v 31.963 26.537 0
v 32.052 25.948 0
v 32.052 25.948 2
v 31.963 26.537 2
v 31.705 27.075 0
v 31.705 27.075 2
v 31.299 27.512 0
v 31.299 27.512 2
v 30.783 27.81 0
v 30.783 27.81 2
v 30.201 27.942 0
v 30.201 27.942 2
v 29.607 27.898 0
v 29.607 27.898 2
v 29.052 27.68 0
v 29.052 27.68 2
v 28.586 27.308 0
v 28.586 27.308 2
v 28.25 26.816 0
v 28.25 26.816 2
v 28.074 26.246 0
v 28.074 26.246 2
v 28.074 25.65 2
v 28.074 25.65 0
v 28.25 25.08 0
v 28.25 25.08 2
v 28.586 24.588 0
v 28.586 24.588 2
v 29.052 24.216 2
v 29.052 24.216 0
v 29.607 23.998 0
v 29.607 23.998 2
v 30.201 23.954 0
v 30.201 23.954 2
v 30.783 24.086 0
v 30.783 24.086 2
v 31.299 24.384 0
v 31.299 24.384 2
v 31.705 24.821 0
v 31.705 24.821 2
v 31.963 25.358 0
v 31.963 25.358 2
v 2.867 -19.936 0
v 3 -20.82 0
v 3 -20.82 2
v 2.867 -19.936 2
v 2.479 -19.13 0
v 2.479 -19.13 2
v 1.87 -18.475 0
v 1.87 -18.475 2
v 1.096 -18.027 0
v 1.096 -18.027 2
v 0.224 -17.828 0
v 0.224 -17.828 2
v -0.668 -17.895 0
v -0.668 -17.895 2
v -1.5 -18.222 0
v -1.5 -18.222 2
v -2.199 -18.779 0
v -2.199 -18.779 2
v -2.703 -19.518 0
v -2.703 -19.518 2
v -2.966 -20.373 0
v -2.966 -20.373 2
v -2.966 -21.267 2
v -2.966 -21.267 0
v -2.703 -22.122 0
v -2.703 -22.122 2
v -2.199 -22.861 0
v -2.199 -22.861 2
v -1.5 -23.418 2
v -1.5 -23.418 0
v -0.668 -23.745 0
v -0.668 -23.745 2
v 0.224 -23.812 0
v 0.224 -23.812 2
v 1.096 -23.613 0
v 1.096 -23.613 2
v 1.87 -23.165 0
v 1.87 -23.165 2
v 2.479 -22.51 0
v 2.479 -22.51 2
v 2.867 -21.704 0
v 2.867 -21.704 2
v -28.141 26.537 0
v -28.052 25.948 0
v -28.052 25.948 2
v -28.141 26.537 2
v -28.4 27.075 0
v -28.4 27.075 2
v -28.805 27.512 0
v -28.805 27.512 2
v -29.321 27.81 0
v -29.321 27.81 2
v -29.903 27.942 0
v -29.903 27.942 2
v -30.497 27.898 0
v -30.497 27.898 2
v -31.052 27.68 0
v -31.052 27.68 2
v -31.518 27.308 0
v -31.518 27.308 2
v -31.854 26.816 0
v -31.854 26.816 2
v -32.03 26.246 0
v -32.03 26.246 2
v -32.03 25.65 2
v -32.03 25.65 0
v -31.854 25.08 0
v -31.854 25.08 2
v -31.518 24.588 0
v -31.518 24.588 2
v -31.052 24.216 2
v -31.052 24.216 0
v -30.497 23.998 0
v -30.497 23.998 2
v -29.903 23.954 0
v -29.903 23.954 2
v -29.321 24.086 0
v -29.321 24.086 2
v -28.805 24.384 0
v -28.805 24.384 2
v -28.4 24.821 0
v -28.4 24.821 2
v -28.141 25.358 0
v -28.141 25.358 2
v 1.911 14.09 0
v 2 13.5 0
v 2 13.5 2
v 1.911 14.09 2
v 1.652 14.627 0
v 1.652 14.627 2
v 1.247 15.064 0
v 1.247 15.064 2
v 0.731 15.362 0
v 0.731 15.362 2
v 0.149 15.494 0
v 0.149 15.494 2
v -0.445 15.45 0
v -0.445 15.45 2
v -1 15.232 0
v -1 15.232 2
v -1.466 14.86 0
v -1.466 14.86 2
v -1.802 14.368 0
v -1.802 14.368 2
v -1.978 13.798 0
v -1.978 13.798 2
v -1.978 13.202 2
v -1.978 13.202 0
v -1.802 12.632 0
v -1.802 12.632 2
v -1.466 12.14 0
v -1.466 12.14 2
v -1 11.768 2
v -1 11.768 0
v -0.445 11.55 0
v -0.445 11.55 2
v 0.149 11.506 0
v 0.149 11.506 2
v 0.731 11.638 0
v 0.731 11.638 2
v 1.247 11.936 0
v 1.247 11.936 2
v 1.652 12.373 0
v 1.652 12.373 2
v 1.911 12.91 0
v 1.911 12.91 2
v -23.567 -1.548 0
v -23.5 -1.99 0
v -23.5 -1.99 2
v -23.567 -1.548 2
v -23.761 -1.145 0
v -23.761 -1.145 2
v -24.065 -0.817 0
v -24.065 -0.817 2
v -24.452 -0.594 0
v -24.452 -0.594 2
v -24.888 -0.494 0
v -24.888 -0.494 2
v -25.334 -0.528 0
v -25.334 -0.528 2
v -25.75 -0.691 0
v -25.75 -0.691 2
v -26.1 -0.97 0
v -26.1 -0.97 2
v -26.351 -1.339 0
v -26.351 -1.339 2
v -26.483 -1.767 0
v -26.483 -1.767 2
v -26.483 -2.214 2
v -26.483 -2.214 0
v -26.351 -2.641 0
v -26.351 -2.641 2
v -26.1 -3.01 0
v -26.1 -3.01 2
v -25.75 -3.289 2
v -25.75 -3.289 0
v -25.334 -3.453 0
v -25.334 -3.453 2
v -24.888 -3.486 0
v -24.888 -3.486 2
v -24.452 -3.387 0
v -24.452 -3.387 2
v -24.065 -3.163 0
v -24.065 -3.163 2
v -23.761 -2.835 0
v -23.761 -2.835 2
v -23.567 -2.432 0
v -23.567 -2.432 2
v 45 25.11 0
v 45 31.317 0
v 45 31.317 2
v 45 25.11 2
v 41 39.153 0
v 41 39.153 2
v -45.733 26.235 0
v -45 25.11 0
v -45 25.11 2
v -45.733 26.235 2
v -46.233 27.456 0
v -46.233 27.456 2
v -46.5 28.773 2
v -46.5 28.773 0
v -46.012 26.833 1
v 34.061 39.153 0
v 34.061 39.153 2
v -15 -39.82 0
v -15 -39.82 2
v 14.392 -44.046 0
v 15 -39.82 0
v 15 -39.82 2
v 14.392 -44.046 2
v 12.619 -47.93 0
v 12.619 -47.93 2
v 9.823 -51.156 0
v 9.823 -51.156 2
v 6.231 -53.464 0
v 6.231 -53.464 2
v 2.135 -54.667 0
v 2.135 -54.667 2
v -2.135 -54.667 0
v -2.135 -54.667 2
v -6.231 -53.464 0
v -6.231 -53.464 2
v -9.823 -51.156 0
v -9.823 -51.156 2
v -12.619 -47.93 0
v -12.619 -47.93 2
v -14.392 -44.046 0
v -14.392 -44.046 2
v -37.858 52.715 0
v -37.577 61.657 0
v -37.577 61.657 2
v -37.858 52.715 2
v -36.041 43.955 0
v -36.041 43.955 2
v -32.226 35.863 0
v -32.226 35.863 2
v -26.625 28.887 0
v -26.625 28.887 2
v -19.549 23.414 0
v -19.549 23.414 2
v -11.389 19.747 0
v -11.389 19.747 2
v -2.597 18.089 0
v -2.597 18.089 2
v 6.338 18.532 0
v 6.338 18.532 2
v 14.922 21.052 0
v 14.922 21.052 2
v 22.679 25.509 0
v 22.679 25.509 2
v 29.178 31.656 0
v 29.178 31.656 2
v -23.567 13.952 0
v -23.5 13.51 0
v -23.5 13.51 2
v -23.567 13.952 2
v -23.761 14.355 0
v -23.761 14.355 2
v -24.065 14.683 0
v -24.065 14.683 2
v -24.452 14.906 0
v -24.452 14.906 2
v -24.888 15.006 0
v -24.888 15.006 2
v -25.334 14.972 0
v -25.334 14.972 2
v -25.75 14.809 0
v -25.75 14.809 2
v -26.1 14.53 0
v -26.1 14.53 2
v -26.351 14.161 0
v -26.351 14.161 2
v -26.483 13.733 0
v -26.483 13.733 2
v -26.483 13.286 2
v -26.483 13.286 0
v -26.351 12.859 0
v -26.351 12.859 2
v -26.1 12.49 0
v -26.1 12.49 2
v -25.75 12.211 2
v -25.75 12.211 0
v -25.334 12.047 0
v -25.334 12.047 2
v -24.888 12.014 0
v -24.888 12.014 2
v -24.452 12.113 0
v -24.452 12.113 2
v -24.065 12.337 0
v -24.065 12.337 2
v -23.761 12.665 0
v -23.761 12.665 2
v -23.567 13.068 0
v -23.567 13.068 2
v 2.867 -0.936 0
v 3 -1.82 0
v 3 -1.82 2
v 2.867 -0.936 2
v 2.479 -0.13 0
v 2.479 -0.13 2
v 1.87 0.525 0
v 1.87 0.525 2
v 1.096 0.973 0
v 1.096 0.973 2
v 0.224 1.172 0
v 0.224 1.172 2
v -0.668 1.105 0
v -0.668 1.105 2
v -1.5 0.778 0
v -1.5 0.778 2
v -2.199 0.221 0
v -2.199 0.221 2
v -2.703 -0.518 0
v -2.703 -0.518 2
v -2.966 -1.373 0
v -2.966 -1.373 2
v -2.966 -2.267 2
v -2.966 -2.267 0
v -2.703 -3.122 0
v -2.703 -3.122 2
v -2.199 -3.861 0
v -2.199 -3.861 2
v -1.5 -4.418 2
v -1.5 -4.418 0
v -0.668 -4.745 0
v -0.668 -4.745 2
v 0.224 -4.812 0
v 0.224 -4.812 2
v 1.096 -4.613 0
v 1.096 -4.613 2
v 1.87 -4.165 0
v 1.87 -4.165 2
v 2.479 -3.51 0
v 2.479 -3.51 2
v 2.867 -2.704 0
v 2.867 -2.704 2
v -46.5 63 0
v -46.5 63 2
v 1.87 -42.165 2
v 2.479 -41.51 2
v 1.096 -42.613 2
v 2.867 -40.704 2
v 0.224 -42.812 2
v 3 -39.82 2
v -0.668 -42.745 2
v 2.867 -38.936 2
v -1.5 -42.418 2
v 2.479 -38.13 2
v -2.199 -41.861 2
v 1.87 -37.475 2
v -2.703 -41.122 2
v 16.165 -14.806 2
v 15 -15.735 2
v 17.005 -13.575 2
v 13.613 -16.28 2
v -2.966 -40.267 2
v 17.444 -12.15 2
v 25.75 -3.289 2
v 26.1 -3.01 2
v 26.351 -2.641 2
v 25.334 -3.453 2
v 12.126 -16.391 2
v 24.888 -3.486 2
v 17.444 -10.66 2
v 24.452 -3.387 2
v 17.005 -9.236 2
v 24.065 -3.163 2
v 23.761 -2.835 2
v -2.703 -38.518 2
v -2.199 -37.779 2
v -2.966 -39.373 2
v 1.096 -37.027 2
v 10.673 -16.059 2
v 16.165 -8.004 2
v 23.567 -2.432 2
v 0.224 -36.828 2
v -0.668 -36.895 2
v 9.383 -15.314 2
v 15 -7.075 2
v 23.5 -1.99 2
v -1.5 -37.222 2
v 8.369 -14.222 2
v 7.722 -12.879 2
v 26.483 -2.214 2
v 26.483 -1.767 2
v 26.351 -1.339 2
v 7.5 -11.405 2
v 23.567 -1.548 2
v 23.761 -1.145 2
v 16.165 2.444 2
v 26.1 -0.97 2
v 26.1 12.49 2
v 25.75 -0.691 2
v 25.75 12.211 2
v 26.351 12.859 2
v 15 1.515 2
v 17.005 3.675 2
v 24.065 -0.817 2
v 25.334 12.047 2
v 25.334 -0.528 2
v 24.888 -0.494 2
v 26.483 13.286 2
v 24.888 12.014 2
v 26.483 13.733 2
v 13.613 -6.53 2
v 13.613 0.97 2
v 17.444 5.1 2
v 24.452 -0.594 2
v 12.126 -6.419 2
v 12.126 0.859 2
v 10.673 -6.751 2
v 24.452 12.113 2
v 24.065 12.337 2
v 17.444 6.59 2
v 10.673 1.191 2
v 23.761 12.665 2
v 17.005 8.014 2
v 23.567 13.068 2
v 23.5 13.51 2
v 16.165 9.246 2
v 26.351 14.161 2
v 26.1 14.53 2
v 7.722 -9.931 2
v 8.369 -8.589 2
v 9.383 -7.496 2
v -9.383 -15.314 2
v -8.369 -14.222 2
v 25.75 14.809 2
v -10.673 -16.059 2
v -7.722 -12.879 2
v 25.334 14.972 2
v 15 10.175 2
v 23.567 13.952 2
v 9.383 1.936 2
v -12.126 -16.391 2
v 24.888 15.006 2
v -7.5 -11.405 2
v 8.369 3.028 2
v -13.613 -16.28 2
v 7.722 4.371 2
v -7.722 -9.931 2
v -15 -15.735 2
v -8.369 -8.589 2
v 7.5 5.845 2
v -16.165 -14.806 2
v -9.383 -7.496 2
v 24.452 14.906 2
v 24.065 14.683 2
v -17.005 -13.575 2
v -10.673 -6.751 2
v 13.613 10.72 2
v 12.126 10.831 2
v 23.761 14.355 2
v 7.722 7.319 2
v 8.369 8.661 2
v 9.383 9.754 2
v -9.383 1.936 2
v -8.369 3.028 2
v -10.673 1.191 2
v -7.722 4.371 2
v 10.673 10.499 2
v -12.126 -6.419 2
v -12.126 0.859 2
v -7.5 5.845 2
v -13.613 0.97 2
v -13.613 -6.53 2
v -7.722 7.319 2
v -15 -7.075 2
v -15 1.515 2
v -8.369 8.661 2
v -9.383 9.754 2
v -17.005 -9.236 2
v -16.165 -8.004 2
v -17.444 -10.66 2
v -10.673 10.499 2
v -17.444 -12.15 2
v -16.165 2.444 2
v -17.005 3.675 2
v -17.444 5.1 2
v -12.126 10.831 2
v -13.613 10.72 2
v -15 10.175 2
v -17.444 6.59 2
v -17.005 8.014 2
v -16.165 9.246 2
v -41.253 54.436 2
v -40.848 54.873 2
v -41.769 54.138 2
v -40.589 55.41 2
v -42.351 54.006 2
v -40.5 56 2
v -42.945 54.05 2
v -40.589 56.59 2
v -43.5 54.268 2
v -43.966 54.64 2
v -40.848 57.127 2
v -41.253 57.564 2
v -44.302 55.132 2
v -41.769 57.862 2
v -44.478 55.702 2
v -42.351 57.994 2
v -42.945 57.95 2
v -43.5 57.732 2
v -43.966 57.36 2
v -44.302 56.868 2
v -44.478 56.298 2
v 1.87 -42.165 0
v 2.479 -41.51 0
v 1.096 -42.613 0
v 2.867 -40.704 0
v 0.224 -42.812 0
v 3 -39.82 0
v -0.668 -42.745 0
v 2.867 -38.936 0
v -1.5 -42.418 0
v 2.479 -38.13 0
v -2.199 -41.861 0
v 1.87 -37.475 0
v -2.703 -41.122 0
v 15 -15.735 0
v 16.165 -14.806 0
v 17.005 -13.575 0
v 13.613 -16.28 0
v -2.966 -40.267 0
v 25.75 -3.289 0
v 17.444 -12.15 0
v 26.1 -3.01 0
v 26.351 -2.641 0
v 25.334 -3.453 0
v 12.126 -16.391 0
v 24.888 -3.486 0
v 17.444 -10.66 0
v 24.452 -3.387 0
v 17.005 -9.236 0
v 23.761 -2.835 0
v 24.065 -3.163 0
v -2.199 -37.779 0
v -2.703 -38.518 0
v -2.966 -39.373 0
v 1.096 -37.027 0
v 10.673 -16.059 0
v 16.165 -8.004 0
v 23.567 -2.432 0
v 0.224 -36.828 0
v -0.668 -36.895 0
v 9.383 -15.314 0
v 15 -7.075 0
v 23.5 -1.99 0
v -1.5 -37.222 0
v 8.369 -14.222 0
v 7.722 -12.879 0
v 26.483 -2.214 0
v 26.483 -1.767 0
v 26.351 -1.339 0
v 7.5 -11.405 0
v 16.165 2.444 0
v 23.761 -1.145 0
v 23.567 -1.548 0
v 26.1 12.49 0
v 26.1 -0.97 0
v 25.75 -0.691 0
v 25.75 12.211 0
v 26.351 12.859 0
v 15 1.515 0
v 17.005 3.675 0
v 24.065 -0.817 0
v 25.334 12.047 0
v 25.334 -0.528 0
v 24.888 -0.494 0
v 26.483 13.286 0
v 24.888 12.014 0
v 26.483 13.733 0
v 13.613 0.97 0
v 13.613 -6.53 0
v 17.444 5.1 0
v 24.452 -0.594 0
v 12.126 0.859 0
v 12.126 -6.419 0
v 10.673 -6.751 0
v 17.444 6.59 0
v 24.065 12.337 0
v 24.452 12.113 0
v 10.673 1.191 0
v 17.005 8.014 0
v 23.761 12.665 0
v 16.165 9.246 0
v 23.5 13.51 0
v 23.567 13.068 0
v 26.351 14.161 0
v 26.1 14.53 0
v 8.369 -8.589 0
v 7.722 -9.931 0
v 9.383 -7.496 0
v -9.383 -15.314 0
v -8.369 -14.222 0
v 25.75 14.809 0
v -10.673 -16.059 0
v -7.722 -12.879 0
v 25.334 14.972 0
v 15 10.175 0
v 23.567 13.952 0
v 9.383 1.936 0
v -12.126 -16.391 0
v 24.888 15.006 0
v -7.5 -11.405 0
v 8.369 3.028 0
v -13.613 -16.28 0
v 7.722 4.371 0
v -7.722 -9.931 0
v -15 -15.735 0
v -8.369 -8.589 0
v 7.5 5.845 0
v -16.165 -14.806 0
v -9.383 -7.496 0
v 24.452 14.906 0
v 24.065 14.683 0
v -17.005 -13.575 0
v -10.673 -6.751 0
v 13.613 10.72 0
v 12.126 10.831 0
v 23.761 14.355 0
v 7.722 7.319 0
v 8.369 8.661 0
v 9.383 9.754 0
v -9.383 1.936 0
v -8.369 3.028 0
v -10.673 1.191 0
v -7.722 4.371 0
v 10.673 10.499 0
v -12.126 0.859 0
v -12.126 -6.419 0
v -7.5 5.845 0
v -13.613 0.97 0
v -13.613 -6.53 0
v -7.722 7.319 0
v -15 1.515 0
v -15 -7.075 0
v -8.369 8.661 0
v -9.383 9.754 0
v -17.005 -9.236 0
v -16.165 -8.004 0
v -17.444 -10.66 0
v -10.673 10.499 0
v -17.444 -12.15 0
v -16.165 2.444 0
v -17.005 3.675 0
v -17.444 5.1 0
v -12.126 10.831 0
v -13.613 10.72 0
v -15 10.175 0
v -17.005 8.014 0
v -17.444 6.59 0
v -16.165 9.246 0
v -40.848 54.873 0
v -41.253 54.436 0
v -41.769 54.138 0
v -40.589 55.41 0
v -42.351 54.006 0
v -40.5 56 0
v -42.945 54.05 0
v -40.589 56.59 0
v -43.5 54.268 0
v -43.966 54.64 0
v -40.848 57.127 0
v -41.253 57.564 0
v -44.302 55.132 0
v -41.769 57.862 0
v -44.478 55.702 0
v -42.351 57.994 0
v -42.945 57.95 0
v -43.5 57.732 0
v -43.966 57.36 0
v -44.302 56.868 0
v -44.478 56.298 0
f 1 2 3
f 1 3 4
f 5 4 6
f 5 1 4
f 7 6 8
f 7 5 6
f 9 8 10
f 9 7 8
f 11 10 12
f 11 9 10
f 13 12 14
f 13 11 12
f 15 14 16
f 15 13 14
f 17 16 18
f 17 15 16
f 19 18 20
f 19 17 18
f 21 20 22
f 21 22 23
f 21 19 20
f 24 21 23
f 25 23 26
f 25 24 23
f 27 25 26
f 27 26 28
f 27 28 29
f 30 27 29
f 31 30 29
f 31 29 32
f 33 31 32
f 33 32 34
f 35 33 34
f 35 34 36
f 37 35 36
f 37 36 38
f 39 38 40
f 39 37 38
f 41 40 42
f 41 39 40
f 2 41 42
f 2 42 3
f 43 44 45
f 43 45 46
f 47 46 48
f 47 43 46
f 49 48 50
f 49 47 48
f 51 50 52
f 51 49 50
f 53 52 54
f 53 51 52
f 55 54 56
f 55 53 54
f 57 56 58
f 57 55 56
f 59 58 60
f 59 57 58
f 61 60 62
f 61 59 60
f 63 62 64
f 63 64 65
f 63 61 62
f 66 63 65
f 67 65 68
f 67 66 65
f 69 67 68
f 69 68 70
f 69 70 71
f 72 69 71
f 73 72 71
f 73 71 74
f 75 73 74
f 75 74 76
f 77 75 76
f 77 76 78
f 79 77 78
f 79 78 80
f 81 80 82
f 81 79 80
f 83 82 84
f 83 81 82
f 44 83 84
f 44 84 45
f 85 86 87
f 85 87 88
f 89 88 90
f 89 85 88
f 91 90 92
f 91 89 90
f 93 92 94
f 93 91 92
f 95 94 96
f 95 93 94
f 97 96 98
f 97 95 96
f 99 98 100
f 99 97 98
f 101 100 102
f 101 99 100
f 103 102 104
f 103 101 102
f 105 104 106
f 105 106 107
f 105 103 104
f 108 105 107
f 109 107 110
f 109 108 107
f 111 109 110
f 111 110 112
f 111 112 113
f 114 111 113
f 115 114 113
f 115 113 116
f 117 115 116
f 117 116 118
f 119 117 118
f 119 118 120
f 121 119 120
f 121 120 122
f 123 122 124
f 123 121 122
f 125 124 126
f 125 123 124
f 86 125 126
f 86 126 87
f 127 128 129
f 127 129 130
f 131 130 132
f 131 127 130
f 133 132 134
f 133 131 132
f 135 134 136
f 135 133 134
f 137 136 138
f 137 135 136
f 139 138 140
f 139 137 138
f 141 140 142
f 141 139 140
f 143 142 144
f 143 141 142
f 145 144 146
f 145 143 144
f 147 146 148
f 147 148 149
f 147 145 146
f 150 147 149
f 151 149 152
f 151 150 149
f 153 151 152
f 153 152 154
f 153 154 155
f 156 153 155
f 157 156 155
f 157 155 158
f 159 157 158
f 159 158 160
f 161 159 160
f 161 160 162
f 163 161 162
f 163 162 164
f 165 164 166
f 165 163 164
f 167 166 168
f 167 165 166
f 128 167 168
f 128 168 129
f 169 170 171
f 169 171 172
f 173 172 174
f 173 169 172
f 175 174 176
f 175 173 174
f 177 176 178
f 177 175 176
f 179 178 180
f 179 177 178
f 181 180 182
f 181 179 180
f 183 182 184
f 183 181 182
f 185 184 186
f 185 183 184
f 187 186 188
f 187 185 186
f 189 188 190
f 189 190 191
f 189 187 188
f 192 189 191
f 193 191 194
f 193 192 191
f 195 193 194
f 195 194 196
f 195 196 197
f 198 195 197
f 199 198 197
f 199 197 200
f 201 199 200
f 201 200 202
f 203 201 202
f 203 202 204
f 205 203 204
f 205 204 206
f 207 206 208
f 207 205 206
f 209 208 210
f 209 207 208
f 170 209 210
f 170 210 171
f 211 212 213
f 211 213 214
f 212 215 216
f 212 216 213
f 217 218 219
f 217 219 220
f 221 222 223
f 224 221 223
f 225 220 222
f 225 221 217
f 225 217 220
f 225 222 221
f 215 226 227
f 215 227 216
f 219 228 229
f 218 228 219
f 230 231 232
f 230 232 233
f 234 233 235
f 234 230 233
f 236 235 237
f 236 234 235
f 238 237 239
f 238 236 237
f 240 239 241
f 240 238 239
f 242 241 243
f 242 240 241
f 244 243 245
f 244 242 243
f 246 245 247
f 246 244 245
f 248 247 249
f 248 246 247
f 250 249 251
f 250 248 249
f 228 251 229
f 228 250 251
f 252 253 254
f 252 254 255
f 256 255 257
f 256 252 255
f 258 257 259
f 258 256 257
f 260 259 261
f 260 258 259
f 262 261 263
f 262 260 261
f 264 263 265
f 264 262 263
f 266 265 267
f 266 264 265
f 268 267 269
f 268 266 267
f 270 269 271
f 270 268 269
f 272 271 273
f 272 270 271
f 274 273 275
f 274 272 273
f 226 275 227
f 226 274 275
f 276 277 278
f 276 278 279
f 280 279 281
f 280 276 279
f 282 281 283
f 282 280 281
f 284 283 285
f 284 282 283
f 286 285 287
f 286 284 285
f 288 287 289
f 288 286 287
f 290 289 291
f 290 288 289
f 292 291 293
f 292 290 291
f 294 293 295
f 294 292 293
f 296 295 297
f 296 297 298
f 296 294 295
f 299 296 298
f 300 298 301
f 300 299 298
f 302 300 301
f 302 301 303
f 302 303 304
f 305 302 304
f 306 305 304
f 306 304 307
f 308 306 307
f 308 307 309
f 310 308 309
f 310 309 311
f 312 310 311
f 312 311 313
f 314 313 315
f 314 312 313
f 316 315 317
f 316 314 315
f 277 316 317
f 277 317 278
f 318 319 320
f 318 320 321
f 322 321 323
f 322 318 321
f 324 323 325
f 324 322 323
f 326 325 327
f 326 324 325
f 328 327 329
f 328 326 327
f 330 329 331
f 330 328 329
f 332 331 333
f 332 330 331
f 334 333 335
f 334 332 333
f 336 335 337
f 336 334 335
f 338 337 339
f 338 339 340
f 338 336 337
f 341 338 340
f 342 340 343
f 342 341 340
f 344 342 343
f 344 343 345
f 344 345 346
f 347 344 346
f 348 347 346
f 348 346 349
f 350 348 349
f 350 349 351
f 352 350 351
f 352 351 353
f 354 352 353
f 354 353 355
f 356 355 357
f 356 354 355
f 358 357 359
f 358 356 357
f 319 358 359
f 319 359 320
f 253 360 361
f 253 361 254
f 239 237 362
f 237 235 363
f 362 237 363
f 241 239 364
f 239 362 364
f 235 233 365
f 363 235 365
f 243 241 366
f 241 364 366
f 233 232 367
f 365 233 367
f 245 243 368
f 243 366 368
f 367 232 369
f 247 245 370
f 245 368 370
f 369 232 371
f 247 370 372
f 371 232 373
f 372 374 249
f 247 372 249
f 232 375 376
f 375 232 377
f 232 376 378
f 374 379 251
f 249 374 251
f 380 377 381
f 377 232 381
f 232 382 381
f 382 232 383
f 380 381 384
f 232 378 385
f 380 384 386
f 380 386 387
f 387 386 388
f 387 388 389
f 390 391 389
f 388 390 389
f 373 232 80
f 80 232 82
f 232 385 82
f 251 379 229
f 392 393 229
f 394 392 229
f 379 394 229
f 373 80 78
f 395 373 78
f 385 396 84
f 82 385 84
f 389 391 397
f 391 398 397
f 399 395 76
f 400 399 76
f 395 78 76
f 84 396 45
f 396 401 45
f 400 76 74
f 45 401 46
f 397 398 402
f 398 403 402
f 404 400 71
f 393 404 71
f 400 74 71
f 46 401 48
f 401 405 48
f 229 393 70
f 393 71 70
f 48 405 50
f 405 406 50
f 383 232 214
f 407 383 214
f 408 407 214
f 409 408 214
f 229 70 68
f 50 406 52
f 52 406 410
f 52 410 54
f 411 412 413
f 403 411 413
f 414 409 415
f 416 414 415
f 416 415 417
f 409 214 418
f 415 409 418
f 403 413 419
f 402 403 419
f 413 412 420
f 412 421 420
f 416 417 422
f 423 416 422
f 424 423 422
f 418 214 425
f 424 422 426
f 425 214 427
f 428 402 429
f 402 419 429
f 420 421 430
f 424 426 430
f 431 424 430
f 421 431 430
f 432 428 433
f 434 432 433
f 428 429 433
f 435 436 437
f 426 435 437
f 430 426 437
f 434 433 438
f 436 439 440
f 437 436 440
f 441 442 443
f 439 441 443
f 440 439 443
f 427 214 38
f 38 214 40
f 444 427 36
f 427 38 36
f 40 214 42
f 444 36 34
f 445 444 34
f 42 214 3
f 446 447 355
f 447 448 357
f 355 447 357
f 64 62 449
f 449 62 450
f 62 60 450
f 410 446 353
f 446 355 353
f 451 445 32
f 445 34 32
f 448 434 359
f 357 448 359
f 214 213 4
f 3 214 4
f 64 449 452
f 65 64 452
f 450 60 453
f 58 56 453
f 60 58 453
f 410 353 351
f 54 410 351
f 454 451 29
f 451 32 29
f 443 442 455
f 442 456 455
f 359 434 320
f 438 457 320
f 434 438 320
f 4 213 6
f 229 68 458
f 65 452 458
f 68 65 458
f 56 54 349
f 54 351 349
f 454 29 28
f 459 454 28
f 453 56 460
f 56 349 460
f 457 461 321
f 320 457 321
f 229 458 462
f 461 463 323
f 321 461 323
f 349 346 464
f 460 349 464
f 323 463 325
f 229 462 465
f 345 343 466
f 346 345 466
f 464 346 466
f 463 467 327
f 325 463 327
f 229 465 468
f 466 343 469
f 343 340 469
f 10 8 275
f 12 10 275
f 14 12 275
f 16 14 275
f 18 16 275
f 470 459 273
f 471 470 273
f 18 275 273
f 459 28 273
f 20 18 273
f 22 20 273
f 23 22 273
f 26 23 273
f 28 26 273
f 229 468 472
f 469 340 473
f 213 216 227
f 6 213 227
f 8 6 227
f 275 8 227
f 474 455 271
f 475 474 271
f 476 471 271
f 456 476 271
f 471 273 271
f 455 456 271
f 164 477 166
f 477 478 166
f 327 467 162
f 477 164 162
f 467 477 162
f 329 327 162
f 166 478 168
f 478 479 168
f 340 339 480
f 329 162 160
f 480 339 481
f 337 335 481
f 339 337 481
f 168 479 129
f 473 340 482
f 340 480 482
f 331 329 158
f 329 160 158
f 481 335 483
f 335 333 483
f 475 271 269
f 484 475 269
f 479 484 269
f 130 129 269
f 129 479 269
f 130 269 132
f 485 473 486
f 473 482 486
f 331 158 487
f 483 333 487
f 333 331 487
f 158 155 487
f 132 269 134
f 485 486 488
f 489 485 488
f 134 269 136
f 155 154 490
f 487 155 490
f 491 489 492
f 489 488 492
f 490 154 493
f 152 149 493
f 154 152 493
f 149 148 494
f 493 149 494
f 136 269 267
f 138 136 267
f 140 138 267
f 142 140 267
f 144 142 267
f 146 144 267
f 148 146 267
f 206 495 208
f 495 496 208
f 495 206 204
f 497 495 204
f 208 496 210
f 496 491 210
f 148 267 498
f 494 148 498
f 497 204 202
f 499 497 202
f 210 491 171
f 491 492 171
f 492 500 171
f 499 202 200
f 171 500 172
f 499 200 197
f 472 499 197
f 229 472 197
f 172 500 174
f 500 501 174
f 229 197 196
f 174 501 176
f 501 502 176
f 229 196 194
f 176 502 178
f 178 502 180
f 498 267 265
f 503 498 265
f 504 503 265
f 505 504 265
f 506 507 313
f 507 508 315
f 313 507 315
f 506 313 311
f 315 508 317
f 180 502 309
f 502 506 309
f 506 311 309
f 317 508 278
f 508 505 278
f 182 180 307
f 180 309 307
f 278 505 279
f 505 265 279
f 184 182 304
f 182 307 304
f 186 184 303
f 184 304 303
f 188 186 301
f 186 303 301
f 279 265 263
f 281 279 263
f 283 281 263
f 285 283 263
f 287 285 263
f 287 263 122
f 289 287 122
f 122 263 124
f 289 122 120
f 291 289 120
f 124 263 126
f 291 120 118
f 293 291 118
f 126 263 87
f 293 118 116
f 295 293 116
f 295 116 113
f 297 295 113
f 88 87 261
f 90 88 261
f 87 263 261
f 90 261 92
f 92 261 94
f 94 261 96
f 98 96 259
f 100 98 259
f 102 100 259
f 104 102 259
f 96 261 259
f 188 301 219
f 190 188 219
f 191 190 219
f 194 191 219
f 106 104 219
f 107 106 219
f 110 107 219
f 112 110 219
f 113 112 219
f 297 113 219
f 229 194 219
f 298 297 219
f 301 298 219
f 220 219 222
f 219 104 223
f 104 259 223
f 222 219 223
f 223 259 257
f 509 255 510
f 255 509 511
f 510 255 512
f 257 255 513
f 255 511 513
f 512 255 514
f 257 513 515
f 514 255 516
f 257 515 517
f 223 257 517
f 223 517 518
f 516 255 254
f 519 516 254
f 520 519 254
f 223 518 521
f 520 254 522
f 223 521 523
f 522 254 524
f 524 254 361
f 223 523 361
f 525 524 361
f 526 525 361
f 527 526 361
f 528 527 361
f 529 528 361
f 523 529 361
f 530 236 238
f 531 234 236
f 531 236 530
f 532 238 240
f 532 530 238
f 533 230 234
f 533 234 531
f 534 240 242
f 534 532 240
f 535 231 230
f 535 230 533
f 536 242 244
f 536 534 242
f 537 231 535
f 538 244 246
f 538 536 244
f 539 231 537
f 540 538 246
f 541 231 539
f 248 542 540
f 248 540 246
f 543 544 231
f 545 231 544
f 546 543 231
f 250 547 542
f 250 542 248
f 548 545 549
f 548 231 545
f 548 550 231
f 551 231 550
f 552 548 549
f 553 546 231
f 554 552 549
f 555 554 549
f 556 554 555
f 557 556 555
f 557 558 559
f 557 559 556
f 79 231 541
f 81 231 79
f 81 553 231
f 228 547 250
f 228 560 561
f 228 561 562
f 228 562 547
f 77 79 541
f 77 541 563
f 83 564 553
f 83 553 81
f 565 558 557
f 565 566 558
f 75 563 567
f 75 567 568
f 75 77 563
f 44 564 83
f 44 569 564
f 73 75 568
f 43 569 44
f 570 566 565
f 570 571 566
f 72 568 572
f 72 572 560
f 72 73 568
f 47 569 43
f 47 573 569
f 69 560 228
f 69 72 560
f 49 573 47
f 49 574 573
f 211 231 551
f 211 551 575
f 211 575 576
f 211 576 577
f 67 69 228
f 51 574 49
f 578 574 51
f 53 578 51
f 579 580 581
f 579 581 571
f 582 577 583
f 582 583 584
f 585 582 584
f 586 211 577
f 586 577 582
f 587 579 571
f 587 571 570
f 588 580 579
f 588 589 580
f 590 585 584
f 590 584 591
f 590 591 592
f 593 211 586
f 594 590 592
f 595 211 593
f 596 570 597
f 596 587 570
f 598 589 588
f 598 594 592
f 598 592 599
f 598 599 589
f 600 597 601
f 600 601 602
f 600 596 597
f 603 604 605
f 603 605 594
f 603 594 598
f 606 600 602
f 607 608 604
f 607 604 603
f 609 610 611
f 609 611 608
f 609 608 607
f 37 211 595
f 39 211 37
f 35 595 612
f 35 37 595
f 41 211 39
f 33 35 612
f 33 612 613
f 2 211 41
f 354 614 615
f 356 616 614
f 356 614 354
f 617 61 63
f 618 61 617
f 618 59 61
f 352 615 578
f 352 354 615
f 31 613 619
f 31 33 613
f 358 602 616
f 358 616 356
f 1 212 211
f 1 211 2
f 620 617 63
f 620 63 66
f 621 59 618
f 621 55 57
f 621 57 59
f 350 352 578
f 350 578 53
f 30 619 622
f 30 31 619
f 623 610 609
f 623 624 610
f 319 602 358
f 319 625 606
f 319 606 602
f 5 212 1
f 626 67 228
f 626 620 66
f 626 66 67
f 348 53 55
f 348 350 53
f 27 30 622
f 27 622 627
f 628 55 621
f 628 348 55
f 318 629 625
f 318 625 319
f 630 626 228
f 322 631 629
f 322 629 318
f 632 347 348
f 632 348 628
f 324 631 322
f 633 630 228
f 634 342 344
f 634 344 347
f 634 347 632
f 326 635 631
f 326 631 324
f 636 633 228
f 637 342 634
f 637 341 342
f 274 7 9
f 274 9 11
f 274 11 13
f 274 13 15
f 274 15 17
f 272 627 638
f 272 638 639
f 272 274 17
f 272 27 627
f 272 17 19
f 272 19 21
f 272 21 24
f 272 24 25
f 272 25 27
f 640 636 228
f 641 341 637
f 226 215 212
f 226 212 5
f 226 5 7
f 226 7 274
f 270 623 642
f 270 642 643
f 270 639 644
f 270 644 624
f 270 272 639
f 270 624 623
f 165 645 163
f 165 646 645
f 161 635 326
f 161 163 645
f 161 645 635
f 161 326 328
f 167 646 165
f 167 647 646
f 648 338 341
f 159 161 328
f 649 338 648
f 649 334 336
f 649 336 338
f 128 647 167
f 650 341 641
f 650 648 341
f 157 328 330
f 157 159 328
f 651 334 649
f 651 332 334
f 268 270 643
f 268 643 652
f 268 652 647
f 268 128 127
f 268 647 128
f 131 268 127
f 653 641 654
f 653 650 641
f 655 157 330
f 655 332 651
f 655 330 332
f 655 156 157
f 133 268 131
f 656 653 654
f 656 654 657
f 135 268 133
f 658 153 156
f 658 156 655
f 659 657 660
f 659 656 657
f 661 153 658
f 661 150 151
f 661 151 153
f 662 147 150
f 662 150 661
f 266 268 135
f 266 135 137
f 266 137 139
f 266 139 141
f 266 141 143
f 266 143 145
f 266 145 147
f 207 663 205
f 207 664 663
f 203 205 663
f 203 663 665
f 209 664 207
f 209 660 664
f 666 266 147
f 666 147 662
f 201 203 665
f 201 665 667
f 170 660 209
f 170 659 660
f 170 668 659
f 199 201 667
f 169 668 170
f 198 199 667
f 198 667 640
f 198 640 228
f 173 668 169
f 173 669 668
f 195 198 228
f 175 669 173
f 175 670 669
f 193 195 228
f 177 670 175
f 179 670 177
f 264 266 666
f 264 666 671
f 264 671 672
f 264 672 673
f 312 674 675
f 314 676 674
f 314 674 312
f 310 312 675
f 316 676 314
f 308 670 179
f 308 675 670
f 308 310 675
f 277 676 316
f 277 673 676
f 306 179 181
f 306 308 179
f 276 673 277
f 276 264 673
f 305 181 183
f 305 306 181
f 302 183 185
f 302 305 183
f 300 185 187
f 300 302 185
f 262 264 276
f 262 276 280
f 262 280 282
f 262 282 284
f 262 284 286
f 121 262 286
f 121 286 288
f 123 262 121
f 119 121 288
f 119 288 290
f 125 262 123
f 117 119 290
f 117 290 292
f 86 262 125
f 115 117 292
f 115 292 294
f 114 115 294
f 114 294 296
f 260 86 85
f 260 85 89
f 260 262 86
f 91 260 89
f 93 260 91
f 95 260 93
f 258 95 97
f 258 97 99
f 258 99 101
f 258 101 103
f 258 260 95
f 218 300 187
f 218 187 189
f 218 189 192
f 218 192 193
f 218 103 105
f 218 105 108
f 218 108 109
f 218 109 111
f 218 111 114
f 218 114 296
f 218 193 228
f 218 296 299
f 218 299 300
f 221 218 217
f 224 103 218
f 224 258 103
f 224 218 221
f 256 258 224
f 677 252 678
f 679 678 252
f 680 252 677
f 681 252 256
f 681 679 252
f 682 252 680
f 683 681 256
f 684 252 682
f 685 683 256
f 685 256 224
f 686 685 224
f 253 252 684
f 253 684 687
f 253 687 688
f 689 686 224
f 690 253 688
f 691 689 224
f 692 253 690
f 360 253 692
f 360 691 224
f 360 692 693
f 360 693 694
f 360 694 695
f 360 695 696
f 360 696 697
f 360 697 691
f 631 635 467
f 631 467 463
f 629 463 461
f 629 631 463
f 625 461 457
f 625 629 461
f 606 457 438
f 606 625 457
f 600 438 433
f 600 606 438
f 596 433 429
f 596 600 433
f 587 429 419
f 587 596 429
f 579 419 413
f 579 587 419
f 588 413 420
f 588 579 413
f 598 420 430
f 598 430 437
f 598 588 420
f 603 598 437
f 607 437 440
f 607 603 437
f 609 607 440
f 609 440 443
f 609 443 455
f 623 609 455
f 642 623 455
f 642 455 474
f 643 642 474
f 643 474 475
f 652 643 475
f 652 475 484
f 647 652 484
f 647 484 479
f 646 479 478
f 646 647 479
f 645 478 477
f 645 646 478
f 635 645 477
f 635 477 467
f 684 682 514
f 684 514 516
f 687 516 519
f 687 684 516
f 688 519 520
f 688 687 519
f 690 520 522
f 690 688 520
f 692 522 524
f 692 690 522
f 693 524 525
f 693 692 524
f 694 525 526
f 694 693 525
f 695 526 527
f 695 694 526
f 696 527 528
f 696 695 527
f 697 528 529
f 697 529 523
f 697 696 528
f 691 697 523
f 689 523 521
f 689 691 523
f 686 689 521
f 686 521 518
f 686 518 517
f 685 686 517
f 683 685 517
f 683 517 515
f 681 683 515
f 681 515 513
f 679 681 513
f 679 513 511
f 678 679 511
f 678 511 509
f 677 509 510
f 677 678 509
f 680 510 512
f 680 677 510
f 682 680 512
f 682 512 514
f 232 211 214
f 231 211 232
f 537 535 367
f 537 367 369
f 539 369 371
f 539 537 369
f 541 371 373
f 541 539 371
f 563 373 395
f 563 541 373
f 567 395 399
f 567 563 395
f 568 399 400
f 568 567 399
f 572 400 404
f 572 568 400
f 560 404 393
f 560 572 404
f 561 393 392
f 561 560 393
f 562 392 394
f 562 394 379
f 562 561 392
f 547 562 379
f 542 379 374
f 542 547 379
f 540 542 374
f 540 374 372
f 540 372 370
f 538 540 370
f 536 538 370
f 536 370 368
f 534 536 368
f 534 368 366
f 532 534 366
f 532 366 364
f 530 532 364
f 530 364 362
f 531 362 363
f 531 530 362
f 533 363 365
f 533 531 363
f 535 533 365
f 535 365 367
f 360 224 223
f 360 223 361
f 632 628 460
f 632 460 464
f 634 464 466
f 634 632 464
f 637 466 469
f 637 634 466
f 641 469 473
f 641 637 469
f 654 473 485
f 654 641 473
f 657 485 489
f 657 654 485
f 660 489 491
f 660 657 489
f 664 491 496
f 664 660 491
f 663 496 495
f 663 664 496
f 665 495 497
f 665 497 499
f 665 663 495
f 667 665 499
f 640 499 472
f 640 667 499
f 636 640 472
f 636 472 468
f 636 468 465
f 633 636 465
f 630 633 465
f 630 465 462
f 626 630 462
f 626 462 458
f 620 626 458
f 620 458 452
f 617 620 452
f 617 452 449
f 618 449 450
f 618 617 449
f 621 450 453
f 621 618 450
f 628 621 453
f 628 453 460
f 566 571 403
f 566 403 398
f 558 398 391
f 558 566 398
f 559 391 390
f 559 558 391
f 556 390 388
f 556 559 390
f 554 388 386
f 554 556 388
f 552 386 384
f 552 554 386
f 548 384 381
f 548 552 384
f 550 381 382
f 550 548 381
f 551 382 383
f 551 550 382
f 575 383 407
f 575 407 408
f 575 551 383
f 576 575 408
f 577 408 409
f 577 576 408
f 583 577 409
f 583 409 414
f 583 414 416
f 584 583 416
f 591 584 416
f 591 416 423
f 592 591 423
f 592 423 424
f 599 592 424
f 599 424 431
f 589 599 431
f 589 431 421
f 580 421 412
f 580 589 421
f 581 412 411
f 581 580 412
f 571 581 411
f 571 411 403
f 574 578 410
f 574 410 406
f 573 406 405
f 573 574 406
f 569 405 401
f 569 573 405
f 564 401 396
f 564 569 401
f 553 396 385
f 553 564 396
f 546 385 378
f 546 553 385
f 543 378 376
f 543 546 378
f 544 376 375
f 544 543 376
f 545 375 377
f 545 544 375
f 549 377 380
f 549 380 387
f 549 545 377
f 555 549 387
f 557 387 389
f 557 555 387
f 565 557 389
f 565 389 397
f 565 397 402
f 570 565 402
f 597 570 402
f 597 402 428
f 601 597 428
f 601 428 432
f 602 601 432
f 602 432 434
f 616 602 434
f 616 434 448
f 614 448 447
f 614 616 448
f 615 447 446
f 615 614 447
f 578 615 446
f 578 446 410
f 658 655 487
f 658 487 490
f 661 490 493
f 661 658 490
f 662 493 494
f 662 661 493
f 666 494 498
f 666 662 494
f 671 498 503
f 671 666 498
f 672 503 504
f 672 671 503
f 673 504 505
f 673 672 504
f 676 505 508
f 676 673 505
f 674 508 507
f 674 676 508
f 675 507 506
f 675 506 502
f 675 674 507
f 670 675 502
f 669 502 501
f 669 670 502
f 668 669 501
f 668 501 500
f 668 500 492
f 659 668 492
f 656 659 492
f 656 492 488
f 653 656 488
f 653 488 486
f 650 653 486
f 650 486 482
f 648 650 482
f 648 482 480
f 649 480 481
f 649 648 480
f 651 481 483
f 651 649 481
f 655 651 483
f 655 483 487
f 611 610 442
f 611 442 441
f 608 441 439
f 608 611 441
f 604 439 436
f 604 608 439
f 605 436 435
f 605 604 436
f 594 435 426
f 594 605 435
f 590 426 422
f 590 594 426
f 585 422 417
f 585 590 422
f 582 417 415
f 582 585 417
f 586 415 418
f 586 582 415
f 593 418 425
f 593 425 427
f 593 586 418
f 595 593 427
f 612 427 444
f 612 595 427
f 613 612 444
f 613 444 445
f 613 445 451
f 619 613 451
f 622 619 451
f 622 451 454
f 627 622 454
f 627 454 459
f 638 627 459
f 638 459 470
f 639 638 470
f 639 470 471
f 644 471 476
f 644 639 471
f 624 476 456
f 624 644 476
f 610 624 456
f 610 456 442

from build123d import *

# Parameters (mm, degrees)
SKETCH_3_R      = 3
SKETCH_3_R_2    = 2
SKETCH_3_R_3    = 1.5
SKETCH_3_R_4    = 5
EXTRUDE_1_DEPTH = 2


with BuildPart() as part:
    # 草图3 → 凸台-拉伸1 (new body)
    with BuildSketch(Plane.XY):
        with BuildLine():
            Line((-46.5, 63), (-37.576612526, 61.656694359))
            ThreePointArc((-37.576612526, 61.656694359), (-11.38853896, 19.746708007), (34.06116735, 39.152540881))
            Line((34.06116735, 39.152540881), (41, 39.152540881))
            Line((41, 39.152540881), (45, 31.317051182))
            Line((45, 31.317051182), (45, 25.109783315))
            Line((45, 25.109783315), (15, -39.82))
            ThreePointArc((15, -39.82), (0, -54.82), (-15, -39.82))
            Line((-15, -39.82), (-45, 25.109783315))
            add(Edge.make_bspline(
                [(-45, 25.109783315), (-46.274240542, 26.725120767), (-46.5, 28.773494756)],
                knots=[0, 0, 0, 1, 1, 1], degree=2))
            Line((-46.5, 28.773494756), (-46.5, 63))
        make_face()
        with Locations((0, -1.82)):
            Circle(SKETCH_3_R, mode=Mode.SUBTRACT)
        with Locations((0, 13.5)):
            Circle(SKETCH_3_R_2, mode=Mode.SUBTRACT)
        with Locations((-30.0520382, 25.9479618)):
            Circle(SKETCH_3_R_2, mode=Mode.SUBTRACT)
        with Locations((-42.5, 56)):
            Circle(SKETCH_3_R_2, mode=Mode.SUBTRACT)
        with Locations((30.0520382, 25.9479618)):
            Circle(SKETCH_3_R_2, mode=Mode.SUBTRACT)
        with Locations((0, -20.82)):
            Circle(SKETCH_3_R, mode=Mode.SUBTRACT)
        with Locations((0, -39.82)):
            Circle(SKETCH_3_R, mode=Mode.SUBTRACT)
        with Locations((-25, -1.990216685)):
            Circle(SKETCH_3_R_3, mode=Mode.SUBTRACT)
        with Locations((-25, 13.509783315)):
            Circle(SKETCH_3_R_3, mode=Mode.SUBTRACT)
        with Locations(Location((25, 13.509783315, 0), (0, 0, 180))):
            Circle(SKETCH_3_R_3, mode=Mode.SUBTRACT)
        with Locations(Location((25, -1.990216685, 0), (0, 0, 180))):
            Circle(SKETCH_3_R_3, mode=Mode.SUBTRACT)
        with Locations((-12.5, -11.405108343)):
            Circle(SKETCH_3_R_4, mode=Mode.SUBTRACT)
        with Locations((-12.5, 5.844891657)):
            Circle(SKETCH_3_R_4, mode=Mode.SUBTRACT)
        with Locations(Location((12.5, 5.844891657, 0), (0, 0, 180))):
            Circle(SKETCH_3_R_4, mode=Mode.SUBTRACT)
        with Locations(Location((12.5, -11.405108343, 0), (0, 0, 180))):
            Circle(SKETCH_3_R_4, mode=Mode.SUBTRACT)
    extrude(amount=EXTRUDE_1_DEPTH)


solid = part.part
